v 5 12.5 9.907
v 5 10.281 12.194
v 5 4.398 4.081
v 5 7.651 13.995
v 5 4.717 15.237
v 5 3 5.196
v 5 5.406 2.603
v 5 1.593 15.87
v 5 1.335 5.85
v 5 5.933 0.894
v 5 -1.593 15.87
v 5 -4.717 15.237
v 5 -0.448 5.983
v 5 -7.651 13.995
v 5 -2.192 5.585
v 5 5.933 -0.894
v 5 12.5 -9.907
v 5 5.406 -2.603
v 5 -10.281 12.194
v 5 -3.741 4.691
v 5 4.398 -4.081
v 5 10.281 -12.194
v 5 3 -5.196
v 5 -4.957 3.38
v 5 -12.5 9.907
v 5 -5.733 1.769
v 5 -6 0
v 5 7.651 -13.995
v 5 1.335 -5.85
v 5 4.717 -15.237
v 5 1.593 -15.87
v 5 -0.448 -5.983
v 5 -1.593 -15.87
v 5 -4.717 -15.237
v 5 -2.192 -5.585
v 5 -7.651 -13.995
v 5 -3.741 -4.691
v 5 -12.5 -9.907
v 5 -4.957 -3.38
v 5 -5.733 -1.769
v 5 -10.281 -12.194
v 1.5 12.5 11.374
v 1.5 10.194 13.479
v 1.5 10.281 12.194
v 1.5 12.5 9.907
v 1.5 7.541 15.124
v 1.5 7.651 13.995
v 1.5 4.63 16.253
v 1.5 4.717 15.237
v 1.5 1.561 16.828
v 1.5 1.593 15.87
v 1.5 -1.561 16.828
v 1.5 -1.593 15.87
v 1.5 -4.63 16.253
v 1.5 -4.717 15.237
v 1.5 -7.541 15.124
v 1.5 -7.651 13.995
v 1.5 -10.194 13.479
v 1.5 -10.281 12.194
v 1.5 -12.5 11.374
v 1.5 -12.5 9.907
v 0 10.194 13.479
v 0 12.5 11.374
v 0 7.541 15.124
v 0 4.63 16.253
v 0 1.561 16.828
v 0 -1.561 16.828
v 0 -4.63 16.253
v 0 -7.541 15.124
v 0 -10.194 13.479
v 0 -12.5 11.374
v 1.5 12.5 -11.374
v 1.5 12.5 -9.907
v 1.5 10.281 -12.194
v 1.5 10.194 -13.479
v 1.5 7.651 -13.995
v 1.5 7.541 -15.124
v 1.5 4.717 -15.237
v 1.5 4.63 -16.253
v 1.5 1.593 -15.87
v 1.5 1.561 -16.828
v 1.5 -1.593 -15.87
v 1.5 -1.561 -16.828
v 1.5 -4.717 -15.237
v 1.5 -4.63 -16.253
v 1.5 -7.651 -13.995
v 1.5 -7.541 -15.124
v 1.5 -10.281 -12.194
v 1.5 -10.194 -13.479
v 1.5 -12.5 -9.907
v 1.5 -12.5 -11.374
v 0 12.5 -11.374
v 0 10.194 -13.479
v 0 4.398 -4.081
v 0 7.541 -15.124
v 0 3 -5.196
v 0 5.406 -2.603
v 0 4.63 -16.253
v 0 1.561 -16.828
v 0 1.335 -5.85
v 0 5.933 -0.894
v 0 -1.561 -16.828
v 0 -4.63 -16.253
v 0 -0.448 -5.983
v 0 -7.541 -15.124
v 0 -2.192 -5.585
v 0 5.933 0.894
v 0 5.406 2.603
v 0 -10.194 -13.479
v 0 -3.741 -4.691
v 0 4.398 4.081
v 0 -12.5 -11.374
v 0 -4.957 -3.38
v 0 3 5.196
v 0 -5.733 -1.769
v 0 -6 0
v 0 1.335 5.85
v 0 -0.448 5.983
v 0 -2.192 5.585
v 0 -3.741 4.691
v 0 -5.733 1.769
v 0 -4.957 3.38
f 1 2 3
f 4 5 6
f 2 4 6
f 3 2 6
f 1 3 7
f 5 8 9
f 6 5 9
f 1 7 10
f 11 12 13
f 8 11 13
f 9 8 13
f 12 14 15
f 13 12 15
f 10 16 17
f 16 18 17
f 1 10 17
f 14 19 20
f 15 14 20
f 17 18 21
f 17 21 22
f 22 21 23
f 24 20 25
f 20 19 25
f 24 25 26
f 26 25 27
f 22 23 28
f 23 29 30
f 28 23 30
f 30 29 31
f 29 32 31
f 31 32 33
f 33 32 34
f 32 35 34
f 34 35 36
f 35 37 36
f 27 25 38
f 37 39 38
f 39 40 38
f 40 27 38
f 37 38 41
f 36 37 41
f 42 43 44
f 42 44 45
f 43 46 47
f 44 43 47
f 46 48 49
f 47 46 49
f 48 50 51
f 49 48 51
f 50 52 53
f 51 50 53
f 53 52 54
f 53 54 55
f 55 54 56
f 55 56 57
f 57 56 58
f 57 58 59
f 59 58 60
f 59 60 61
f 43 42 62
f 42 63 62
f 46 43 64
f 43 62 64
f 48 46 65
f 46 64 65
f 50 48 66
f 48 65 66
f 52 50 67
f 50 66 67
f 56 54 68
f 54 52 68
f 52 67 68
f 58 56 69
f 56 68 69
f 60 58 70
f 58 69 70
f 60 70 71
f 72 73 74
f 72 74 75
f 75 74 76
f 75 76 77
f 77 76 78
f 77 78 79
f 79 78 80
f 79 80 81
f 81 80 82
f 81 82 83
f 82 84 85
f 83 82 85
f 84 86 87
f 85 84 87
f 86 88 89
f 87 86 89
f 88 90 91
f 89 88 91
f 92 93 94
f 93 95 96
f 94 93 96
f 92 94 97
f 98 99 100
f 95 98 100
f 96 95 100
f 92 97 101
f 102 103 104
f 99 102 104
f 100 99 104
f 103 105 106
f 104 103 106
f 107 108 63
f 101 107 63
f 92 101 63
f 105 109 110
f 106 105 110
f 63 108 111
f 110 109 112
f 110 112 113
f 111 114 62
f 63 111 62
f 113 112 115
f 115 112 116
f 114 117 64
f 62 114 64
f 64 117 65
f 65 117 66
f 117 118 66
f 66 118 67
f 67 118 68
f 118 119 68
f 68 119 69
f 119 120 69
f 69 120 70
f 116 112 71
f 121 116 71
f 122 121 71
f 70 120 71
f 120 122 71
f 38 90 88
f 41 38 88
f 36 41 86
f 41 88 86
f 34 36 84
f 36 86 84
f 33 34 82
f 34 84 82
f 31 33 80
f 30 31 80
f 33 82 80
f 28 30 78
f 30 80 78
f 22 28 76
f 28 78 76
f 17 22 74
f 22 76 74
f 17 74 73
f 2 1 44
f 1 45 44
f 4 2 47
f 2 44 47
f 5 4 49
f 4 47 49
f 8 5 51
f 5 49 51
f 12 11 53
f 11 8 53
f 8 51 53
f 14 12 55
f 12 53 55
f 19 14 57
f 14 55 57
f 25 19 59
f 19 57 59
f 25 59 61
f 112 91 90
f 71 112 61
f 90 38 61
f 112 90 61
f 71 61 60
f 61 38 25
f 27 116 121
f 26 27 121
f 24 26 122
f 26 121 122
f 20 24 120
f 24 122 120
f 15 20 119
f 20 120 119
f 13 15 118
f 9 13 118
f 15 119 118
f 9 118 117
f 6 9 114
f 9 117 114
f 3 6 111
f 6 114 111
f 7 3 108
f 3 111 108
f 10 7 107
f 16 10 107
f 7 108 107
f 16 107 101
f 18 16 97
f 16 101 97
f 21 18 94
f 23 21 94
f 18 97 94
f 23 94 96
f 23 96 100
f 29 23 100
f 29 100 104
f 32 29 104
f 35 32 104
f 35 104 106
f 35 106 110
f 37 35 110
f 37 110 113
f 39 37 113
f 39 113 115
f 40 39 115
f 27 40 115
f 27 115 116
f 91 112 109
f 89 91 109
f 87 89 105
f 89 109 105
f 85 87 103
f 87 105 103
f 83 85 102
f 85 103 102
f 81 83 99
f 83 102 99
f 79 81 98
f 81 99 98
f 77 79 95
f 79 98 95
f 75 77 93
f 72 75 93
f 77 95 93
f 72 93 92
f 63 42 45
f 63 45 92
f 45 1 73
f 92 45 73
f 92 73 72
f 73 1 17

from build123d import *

# Parameters (mm, degrees)
F3_D     = 12
F5_DEPTH = 25


with BuildPart() as f1:
    # F0 (on Front) → F1 (revolve)
    with BuildSketch(Plane.XZ):
        Polygon((0, 16.9), (0, 0), (5, 0), (5, 15.95), (1.5, 15.95), (1.5, 16.9), align=None)
    revolve(axis=Axis((2.5, 0, 0), (1, 0, 0)))

    # F3 (through all)
    with Locations(Plane.YZ.offset(5)):
        with Locations((0, 0)):
            Hole(F3_D / 2)

    # F4 (on face) → F5 (cut)
    with BuildSketch(Plane.YZ.offset(5)):
        with BuildLine():
            Line((-12.5, -9.9071943556), (-12.5, 9.9071943556))
            ThreePointArc((-12.5, 9.9071943556), (-15.95, 0), (-12.5, -9.9071943556))
        make_face()
        with BuildLine():
            Line((-12.5, 9.9071943556), (-12.5, 11.3736537665))
            ThreePointArc((-12.5, 11.3736537665), (-16.9, 0), (-12.5, -11.3736537665))
            Line((-12.5, -11.3736537665), (-12.5, -9.9071943556))
            ThreePointArc((-12.5, -9.9071943556), (-15.95, 0), (-12.5, 9.9071943556))
        make_face()
        with BuildLine():
            ThreePointArc((15.95, 0), (15.0628267599, 5.2453550881), (12.5, 9.9071943556))
            Line((12.5, 9.9071943556), (12.5, -9.9071943556))
            ThreePointArc((12.5, -9.9071943556), (15.0628267599, -5.2453550881), (15.95, 0))
        make_face()
        with BuildLine():
            ThreePointArc((12.5, -11.3736537665), (15.7616623489, -6.0975404878), (16.9, 0))
            ThreePointArc((16.9, 0), (15.7616623489, 6.0975404878), (12.5, 11.3736537665))
            Line((12.5, 11.3736537665), (12.5, 9.9071943556))
            ThreePointArc((12.5, 9.9071943556), (15.0628267599, 5.2453550881), (15.95, 0))
            ThreePointArc((15.95, 0), (15.0628267599, -5.2453550881), (12.5, -9.9071943556))
            Line((12.5, -9.9071943556), (12.5, -11.3736537665))
        make_face()
    extrude(amount=-F5_DEPTH, mode=Mode.SUBTRACT)


solid = f1.part
